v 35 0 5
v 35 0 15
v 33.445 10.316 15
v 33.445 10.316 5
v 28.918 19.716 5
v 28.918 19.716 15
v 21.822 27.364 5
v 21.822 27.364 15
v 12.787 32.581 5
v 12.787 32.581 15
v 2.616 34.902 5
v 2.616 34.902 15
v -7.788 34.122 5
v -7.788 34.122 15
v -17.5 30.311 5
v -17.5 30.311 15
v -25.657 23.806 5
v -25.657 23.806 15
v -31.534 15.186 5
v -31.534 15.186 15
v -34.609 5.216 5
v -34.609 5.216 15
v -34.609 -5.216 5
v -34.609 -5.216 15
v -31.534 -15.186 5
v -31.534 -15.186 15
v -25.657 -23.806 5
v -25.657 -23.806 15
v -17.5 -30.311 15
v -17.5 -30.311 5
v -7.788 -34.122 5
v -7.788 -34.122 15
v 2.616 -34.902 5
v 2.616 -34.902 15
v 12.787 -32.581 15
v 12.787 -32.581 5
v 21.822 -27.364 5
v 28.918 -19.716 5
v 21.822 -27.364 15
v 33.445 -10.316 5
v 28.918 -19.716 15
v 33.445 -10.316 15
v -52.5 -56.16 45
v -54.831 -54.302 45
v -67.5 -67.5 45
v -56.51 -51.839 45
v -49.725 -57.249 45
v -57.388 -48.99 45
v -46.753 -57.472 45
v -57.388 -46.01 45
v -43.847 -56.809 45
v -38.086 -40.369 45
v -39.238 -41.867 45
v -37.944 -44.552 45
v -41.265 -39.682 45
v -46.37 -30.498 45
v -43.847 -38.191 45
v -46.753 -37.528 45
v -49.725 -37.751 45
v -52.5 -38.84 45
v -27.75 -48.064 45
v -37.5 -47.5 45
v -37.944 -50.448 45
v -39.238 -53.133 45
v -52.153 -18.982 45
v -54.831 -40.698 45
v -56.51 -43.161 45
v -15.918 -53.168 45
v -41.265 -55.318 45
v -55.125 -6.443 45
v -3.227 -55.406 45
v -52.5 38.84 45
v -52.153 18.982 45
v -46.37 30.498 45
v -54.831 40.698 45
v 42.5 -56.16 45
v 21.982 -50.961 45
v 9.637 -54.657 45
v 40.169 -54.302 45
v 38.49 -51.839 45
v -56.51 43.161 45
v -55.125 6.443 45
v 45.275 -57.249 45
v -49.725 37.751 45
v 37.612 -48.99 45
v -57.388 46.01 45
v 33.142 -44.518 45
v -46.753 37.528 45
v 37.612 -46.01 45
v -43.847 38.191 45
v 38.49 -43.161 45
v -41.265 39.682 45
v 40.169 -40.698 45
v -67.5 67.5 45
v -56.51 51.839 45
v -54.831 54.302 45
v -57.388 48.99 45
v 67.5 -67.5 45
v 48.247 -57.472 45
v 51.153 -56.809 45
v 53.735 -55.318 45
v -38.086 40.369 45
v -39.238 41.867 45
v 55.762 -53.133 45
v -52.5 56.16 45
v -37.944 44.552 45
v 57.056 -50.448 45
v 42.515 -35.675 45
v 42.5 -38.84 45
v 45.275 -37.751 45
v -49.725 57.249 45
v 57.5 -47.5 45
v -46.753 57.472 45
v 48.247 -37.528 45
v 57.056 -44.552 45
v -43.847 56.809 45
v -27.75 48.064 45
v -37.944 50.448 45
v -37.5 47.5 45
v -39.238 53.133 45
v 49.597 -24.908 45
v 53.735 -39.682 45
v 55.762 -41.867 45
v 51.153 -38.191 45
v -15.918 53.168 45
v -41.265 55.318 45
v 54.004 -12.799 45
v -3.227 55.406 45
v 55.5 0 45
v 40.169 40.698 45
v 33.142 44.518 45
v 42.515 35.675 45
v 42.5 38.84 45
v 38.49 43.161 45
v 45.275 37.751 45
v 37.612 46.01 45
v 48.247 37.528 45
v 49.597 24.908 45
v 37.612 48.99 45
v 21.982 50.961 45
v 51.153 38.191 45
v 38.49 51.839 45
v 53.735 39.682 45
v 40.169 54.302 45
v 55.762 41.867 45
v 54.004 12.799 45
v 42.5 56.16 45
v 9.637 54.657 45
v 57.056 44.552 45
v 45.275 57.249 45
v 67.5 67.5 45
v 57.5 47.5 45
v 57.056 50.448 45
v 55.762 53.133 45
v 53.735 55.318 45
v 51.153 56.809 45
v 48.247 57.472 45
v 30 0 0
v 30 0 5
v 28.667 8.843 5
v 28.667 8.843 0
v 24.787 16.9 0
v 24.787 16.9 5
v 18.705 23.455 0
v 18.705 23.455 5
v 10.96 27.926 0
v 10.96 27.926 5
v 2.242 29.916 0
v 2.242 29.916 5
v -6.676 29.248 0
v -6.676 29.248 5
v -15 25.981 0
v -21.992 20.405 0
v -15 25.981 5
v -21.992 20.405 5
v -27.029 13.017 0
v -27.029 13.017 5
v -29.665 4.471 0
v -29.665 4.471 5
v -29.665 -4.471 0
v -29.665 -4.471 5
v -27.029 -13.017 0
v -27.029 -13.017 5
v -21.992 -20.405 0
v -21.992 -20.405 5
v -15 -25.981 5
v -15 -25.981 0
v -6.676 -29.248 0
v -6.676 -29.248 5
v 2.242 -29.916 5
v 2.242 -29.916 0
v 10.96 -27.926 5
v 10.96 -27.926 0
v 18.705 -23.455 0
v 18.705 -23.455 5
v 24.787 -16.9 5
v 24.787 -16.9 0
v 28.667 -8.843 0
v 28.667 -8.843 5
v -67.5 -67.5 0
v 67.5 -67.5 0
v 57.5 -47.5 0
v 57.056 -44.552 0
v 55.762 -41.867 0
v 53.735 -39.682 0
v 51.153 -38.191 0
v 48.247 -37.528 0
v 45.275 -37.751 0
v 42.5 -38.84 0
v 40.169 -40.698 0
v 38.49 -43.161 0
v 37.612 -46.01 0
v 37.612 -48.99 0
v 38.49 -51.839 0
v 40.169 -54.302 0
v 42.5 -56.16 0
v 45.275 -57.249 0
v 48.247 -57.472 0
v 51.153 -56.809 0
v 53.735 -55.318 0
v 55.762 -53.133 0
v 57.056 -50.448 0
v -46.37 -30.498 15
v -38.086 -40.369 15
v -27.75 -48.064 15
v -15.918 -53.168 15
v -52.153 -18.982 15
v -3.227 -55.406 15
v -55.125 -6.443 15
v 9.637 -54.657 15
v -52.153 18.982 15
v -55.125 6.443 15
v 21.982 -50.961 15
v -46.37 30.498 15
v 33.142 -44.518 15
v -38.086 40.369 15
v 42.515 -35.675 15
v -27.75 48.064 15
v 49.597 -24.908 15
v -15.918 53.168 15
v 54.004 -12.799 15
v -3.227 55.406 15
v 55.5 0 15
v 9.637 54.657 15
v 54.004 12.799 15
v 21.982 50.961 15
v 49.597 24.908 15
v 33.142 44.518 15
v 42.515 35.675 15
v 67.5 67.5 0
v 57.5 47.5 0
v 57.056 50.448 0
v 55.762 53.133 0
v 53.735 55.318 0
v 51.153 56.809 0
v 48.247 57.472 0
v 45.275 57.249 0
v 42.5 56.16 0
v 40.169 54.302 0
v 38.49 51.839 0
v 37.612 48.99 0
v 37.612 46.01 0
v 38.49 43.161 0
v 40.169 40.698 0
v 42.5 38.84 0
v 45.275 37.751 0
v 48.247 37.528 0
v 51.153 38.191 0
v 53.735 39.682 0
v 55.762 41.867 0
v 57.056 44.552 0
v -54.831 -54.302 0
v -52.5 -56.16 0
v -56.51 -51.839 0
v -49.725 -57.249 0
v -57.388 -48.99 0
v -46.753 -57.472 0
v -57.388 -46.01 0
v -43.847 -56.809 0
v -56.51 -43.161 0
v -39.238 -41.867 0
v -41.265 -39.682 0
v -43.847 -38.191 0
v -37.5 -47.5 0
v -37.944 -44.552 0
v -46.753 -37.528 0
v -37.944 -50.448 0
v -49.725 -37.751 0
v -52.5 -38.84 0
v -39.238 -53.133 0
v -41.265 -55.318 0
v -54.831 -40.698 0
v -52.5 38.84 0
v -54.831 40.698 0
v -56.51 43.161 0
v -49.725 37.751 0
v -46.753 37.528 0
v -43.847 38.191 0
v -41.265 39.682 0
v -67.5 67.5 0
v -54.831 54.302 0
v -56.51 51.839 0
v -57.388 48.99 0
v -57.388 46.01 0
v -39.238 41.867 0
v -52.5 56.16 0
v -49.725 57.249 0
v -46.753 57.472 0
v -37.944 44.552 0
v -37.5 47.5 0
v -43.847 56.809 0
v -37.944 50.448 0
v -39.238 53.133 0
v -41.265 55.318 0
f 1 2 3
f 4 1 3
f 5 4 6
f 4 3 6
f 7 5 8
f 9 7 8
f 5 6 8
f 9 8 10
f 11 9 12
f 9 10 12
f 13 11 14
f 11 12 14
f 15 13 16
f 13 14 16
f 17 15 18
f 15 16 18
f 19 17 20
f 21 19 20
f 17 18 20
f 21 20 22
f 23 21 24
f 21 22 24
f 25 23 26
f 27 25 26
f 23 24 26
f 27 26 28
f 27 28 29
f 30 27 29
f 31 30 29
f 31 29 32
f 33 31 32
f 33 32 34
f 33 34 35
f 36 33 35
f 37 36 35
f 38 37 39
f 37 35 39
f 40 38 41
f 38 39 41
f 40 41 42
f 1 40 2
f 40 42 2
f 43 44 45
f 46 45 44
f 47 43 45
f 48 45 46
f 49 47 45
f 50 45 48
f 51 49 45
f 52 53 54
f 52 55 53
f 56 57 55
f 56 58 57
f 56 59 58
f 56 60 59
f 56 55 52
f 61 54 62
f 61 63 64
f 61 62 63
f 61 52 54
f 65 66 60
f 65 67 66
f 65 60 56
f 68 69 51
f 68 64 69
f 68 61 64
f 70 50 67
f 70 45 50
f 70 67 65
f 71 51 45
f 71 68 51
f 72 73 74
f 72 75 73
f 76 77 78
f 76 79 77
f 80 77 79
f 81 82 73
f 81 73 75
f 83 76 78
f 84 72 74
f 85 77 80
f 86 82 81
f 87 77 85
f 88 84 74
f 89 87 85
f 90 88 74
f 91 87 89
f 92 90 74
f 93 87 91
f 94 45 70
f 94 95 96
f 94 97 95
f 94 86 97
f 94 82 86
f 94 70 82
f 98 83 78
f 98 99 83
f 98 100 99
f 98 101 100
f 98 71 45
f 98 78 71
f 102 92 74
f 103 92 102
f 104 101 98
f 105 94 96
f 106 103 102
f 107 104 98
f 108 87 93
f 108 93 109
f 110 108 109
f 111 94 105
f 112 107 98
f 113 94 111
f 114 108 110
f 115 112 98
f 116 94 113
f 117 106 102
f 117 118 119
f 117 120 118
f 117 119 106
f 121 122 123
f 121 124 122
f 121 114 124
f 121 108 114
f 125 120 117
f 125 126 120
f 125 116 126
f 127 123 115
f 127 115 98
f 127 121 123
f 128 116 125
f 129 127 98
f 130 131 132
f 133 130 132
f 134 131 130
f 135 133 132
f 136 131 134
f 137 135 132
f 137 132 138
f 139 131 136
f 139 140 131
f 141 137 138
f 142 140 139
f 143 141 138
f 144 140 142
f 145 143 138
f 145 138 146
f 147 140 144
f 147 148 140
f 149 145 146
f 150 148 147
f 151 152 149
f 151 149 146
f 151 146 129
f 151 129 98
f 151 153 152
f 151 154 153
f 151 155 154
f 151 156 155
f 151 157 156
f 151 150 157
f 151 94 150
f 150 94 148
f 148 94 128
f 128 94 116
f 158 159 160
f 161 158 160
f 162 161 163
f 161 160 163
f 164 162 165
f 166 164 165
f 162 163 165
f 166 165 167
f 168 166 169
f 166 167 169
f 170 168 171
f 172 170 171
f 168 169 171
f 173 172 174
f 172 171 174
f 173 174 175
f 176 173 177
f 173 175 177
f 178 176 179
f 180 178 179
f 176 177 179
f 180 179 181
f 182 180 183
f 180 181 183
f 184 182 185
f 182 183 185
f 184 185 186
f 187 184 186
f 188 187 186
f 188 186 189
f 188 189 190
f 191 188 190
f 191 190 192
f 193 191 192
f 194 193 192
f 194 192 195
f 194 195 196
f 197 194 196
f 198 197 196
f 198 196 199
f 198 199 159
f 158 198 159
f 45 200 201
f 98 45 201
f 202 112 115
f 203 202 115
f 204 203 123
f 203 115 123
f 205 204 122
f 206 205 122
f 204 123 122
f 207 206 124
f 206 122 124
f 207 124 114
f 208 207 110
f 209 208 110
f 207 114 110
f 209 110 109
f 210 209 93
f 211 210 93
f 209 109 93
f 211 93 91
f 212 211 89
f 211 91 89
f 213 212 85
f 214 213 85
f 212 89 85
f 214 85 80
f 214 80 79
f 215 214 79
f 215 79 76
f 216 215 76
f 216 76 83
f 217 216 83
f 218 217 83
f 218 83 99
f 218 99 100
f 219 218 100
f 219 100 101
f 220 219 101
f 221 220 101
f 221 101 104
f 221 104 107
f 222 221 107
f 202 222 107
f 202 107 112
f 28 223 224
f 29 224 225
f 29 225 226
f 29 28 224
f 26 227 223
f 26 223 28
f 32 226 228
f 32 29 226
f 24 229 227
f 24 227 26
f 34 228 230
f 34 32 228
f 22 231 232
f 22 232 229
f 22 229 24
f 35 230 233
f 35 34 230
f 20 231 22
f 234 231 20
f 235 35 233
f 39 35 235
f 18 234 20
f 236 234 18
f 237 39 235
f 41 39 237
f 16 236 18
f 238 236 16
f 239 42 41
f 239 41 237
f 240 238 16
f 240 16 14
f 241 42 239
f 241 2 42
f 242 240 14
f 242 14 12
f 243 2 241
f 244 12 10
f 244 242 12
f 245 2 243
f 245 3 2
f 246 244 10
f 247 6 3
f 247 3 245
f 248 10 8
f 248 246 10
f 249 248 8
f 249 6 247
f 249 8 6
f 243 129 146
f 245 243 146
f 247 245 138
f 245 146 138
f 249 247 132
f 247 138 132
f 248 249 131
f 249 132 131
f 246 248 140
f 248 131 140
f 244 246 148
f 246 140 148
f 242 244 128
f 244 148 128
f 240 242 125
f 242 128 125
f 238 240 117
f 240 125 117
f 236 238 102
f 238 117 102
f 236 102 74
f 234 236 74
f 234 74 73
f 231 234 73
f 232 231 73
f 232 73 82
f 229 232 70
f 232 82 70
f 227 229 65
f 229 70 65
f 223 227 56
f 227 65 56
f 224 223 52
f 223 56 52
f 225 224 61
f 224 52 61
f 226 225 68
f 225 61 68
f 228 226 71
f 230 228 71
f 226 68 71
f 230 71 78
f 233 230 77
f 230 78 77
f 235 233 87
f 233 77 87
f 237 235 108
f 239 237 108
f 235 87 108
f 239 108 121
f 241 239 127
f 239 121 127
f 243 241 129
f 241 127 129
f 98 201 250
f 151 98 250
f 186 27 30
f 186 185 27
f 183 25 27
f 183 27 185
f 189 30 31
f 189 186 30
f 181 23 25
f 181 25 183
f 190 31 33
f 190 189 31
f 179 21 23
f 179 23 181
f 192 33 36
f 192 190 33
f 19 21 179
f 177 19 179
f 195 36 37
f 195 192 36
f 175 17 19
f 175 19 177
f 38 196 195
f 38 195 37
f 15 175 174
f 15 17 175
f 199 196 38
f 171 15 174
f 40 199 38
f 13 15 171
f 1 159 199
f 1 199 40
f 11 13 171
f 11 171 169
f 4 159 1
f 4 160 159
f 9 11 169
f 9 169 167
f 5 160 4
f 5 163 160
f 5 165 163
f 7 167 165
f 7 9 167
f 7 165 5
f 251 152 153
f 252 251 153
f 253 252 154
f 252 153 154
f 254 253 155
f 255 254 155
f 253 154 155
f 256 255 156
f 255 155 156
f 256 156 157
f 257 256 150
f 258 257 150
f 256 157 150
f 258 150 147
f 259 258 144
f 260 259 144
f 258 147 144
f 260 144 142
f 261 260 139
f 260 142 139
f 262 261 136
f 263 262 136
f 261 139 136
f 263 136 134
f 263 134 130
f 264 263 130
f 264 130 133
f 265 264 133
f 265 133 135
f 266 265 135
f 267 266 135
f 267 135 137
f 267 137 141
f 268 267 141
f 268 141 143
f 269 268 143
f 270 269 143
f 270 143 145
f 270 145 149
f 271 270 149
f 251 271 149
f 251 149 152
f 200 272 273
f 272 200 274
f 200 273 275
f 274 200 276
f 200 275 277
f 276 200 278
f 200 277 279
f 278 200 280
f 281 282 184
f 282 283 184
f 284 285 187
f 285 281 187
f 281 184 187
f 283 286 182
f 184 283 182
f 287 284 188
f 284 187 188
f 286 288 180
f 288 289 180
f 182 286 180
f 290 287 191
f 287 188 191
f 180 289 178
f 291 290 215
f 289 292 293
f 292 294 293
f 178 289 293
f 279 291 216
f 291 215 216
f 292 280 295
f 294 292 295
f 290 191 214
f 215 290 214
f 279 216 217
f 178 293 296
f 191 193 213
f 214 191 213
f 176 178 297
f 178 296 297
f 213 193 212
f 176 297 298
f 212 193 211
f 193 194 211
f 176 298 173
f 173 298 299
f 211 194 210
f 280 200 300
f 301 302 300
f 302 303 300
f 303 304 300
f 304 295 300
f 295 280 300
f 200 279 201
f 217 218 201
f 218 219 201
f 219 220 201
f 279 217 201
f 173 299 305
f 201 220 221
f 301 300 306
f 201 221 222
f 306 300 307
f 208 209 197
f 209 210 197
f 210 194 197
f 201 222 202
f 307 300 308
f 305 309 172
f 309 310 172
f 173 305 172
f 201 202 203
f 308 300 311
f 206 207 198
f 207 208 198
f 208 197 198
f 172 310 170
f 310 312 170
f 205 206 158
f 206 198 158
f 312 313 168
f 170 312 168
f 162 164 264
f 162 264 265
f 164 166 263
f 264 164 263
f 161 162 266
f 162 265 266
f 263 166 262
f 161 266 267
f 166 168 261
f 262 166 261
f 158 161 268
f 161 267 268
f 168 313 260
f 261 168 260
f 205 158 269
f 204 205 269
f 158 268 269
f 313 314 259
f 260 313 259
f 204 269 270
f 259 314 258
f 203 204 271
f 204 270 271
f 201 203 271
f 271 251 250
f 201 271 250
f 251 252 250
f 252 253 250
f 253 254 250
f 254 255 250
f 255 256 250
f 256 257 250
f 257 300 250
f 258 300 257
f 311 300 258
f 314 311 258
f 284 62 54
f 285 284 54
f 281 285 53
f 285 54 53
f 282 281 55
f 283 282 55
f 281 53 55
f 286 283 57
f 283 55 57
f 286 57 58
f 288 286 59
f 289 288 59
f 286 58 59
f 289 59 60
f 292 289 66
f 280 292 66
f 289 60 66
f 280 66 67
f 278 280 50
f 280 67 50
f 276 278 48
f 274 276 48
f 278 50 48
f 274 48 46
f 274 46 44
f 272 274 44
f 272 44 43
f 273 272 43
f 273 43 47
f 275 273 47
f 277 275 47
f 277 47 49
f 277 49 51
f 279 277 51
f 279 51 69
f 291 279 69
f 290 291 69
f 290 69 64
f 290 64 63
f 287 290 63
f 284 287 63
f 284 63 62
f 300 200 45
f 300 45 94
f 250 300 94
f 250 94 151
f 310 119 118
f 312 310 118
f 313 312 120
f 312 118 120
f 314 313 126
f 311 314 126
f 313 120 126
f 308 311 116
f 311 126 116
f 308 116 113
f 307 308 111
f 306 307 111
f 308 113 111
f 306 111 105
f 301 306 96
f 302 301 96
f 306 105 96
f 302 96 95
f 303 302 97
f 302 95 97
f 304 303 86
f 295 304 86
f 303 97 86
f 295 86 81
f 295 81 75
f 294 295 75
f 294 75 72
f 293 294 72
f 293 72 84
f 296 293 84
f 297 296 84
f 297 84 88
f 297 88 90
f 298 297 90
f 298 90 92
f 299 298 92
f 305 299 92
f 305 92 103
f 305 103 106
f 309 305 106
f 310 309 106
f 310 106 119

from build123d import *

# Parameters (mm, degrees)
SKETCH1_W           = 135
SKETCH1_H           = 135
BOSS_EXTRUDE1_DEPTH = 45
SKETCH2_R           = 10
SKETCH2_R_2         = 30
CUT_EXTRUDE1_DEPTH  = 106.534354596
SKETCH3_R           = 55.5
CUT_EXTRUDE2_DEPTH  = 30
SKETCH4_R           = 35
CUT_EXTRUDE3_DEPTH  = 10


with BuildPart() as part:
    # Sketch1 → Boss-Extrude1 (new body)
    with BuildSketch(Plane.XY):
        Rectangle(SKETCH1_W, SKETCH1_H)
    extrude(amount=BOSS_EXTRUDE1_DEPTH)

    # Sketch2 → Cut-Extrude1 (cut, through all)
    with BuildSketch(Plane.XY.offset(45)):
        with Locations((-47.5, 47.5)):
            Circle(SKETCH2_R)
        with Locations((47.5, 47.5)):
            Circle(SKETCH2_R)
        with Locations((47.5, -47.5)):
            Circle(SKETCH2_R)
        with Locations((-47.5, -47.5)):
            Circle(SKETCH2_R)
        Circle(SKETCH2_R_2)
    extrude(amount=-CUT_EXTRUDE1_DEPTH, mode=Mode.SUBTRACT)

    # Sketch3 → Cut-Extrude2 (cut)
    with BuildSketch(Plane.XY.offset(45)):
        Circle(SKETCH3_R)
    extrude(amount=-CUT_EXTRUDE2_DEPTH, mode=Mode.SUBTRACT)

    # Sketch4 → Cut-Extrude3 (cut)
    with BuildSketch(Plane.XY.offset(15)):
        Circle(SKETCH4_R)
    extrude(amount=-CUT_EXTRUDE3_DEPTH, mode=Mode.SUBTRACT)


solid = part.part
